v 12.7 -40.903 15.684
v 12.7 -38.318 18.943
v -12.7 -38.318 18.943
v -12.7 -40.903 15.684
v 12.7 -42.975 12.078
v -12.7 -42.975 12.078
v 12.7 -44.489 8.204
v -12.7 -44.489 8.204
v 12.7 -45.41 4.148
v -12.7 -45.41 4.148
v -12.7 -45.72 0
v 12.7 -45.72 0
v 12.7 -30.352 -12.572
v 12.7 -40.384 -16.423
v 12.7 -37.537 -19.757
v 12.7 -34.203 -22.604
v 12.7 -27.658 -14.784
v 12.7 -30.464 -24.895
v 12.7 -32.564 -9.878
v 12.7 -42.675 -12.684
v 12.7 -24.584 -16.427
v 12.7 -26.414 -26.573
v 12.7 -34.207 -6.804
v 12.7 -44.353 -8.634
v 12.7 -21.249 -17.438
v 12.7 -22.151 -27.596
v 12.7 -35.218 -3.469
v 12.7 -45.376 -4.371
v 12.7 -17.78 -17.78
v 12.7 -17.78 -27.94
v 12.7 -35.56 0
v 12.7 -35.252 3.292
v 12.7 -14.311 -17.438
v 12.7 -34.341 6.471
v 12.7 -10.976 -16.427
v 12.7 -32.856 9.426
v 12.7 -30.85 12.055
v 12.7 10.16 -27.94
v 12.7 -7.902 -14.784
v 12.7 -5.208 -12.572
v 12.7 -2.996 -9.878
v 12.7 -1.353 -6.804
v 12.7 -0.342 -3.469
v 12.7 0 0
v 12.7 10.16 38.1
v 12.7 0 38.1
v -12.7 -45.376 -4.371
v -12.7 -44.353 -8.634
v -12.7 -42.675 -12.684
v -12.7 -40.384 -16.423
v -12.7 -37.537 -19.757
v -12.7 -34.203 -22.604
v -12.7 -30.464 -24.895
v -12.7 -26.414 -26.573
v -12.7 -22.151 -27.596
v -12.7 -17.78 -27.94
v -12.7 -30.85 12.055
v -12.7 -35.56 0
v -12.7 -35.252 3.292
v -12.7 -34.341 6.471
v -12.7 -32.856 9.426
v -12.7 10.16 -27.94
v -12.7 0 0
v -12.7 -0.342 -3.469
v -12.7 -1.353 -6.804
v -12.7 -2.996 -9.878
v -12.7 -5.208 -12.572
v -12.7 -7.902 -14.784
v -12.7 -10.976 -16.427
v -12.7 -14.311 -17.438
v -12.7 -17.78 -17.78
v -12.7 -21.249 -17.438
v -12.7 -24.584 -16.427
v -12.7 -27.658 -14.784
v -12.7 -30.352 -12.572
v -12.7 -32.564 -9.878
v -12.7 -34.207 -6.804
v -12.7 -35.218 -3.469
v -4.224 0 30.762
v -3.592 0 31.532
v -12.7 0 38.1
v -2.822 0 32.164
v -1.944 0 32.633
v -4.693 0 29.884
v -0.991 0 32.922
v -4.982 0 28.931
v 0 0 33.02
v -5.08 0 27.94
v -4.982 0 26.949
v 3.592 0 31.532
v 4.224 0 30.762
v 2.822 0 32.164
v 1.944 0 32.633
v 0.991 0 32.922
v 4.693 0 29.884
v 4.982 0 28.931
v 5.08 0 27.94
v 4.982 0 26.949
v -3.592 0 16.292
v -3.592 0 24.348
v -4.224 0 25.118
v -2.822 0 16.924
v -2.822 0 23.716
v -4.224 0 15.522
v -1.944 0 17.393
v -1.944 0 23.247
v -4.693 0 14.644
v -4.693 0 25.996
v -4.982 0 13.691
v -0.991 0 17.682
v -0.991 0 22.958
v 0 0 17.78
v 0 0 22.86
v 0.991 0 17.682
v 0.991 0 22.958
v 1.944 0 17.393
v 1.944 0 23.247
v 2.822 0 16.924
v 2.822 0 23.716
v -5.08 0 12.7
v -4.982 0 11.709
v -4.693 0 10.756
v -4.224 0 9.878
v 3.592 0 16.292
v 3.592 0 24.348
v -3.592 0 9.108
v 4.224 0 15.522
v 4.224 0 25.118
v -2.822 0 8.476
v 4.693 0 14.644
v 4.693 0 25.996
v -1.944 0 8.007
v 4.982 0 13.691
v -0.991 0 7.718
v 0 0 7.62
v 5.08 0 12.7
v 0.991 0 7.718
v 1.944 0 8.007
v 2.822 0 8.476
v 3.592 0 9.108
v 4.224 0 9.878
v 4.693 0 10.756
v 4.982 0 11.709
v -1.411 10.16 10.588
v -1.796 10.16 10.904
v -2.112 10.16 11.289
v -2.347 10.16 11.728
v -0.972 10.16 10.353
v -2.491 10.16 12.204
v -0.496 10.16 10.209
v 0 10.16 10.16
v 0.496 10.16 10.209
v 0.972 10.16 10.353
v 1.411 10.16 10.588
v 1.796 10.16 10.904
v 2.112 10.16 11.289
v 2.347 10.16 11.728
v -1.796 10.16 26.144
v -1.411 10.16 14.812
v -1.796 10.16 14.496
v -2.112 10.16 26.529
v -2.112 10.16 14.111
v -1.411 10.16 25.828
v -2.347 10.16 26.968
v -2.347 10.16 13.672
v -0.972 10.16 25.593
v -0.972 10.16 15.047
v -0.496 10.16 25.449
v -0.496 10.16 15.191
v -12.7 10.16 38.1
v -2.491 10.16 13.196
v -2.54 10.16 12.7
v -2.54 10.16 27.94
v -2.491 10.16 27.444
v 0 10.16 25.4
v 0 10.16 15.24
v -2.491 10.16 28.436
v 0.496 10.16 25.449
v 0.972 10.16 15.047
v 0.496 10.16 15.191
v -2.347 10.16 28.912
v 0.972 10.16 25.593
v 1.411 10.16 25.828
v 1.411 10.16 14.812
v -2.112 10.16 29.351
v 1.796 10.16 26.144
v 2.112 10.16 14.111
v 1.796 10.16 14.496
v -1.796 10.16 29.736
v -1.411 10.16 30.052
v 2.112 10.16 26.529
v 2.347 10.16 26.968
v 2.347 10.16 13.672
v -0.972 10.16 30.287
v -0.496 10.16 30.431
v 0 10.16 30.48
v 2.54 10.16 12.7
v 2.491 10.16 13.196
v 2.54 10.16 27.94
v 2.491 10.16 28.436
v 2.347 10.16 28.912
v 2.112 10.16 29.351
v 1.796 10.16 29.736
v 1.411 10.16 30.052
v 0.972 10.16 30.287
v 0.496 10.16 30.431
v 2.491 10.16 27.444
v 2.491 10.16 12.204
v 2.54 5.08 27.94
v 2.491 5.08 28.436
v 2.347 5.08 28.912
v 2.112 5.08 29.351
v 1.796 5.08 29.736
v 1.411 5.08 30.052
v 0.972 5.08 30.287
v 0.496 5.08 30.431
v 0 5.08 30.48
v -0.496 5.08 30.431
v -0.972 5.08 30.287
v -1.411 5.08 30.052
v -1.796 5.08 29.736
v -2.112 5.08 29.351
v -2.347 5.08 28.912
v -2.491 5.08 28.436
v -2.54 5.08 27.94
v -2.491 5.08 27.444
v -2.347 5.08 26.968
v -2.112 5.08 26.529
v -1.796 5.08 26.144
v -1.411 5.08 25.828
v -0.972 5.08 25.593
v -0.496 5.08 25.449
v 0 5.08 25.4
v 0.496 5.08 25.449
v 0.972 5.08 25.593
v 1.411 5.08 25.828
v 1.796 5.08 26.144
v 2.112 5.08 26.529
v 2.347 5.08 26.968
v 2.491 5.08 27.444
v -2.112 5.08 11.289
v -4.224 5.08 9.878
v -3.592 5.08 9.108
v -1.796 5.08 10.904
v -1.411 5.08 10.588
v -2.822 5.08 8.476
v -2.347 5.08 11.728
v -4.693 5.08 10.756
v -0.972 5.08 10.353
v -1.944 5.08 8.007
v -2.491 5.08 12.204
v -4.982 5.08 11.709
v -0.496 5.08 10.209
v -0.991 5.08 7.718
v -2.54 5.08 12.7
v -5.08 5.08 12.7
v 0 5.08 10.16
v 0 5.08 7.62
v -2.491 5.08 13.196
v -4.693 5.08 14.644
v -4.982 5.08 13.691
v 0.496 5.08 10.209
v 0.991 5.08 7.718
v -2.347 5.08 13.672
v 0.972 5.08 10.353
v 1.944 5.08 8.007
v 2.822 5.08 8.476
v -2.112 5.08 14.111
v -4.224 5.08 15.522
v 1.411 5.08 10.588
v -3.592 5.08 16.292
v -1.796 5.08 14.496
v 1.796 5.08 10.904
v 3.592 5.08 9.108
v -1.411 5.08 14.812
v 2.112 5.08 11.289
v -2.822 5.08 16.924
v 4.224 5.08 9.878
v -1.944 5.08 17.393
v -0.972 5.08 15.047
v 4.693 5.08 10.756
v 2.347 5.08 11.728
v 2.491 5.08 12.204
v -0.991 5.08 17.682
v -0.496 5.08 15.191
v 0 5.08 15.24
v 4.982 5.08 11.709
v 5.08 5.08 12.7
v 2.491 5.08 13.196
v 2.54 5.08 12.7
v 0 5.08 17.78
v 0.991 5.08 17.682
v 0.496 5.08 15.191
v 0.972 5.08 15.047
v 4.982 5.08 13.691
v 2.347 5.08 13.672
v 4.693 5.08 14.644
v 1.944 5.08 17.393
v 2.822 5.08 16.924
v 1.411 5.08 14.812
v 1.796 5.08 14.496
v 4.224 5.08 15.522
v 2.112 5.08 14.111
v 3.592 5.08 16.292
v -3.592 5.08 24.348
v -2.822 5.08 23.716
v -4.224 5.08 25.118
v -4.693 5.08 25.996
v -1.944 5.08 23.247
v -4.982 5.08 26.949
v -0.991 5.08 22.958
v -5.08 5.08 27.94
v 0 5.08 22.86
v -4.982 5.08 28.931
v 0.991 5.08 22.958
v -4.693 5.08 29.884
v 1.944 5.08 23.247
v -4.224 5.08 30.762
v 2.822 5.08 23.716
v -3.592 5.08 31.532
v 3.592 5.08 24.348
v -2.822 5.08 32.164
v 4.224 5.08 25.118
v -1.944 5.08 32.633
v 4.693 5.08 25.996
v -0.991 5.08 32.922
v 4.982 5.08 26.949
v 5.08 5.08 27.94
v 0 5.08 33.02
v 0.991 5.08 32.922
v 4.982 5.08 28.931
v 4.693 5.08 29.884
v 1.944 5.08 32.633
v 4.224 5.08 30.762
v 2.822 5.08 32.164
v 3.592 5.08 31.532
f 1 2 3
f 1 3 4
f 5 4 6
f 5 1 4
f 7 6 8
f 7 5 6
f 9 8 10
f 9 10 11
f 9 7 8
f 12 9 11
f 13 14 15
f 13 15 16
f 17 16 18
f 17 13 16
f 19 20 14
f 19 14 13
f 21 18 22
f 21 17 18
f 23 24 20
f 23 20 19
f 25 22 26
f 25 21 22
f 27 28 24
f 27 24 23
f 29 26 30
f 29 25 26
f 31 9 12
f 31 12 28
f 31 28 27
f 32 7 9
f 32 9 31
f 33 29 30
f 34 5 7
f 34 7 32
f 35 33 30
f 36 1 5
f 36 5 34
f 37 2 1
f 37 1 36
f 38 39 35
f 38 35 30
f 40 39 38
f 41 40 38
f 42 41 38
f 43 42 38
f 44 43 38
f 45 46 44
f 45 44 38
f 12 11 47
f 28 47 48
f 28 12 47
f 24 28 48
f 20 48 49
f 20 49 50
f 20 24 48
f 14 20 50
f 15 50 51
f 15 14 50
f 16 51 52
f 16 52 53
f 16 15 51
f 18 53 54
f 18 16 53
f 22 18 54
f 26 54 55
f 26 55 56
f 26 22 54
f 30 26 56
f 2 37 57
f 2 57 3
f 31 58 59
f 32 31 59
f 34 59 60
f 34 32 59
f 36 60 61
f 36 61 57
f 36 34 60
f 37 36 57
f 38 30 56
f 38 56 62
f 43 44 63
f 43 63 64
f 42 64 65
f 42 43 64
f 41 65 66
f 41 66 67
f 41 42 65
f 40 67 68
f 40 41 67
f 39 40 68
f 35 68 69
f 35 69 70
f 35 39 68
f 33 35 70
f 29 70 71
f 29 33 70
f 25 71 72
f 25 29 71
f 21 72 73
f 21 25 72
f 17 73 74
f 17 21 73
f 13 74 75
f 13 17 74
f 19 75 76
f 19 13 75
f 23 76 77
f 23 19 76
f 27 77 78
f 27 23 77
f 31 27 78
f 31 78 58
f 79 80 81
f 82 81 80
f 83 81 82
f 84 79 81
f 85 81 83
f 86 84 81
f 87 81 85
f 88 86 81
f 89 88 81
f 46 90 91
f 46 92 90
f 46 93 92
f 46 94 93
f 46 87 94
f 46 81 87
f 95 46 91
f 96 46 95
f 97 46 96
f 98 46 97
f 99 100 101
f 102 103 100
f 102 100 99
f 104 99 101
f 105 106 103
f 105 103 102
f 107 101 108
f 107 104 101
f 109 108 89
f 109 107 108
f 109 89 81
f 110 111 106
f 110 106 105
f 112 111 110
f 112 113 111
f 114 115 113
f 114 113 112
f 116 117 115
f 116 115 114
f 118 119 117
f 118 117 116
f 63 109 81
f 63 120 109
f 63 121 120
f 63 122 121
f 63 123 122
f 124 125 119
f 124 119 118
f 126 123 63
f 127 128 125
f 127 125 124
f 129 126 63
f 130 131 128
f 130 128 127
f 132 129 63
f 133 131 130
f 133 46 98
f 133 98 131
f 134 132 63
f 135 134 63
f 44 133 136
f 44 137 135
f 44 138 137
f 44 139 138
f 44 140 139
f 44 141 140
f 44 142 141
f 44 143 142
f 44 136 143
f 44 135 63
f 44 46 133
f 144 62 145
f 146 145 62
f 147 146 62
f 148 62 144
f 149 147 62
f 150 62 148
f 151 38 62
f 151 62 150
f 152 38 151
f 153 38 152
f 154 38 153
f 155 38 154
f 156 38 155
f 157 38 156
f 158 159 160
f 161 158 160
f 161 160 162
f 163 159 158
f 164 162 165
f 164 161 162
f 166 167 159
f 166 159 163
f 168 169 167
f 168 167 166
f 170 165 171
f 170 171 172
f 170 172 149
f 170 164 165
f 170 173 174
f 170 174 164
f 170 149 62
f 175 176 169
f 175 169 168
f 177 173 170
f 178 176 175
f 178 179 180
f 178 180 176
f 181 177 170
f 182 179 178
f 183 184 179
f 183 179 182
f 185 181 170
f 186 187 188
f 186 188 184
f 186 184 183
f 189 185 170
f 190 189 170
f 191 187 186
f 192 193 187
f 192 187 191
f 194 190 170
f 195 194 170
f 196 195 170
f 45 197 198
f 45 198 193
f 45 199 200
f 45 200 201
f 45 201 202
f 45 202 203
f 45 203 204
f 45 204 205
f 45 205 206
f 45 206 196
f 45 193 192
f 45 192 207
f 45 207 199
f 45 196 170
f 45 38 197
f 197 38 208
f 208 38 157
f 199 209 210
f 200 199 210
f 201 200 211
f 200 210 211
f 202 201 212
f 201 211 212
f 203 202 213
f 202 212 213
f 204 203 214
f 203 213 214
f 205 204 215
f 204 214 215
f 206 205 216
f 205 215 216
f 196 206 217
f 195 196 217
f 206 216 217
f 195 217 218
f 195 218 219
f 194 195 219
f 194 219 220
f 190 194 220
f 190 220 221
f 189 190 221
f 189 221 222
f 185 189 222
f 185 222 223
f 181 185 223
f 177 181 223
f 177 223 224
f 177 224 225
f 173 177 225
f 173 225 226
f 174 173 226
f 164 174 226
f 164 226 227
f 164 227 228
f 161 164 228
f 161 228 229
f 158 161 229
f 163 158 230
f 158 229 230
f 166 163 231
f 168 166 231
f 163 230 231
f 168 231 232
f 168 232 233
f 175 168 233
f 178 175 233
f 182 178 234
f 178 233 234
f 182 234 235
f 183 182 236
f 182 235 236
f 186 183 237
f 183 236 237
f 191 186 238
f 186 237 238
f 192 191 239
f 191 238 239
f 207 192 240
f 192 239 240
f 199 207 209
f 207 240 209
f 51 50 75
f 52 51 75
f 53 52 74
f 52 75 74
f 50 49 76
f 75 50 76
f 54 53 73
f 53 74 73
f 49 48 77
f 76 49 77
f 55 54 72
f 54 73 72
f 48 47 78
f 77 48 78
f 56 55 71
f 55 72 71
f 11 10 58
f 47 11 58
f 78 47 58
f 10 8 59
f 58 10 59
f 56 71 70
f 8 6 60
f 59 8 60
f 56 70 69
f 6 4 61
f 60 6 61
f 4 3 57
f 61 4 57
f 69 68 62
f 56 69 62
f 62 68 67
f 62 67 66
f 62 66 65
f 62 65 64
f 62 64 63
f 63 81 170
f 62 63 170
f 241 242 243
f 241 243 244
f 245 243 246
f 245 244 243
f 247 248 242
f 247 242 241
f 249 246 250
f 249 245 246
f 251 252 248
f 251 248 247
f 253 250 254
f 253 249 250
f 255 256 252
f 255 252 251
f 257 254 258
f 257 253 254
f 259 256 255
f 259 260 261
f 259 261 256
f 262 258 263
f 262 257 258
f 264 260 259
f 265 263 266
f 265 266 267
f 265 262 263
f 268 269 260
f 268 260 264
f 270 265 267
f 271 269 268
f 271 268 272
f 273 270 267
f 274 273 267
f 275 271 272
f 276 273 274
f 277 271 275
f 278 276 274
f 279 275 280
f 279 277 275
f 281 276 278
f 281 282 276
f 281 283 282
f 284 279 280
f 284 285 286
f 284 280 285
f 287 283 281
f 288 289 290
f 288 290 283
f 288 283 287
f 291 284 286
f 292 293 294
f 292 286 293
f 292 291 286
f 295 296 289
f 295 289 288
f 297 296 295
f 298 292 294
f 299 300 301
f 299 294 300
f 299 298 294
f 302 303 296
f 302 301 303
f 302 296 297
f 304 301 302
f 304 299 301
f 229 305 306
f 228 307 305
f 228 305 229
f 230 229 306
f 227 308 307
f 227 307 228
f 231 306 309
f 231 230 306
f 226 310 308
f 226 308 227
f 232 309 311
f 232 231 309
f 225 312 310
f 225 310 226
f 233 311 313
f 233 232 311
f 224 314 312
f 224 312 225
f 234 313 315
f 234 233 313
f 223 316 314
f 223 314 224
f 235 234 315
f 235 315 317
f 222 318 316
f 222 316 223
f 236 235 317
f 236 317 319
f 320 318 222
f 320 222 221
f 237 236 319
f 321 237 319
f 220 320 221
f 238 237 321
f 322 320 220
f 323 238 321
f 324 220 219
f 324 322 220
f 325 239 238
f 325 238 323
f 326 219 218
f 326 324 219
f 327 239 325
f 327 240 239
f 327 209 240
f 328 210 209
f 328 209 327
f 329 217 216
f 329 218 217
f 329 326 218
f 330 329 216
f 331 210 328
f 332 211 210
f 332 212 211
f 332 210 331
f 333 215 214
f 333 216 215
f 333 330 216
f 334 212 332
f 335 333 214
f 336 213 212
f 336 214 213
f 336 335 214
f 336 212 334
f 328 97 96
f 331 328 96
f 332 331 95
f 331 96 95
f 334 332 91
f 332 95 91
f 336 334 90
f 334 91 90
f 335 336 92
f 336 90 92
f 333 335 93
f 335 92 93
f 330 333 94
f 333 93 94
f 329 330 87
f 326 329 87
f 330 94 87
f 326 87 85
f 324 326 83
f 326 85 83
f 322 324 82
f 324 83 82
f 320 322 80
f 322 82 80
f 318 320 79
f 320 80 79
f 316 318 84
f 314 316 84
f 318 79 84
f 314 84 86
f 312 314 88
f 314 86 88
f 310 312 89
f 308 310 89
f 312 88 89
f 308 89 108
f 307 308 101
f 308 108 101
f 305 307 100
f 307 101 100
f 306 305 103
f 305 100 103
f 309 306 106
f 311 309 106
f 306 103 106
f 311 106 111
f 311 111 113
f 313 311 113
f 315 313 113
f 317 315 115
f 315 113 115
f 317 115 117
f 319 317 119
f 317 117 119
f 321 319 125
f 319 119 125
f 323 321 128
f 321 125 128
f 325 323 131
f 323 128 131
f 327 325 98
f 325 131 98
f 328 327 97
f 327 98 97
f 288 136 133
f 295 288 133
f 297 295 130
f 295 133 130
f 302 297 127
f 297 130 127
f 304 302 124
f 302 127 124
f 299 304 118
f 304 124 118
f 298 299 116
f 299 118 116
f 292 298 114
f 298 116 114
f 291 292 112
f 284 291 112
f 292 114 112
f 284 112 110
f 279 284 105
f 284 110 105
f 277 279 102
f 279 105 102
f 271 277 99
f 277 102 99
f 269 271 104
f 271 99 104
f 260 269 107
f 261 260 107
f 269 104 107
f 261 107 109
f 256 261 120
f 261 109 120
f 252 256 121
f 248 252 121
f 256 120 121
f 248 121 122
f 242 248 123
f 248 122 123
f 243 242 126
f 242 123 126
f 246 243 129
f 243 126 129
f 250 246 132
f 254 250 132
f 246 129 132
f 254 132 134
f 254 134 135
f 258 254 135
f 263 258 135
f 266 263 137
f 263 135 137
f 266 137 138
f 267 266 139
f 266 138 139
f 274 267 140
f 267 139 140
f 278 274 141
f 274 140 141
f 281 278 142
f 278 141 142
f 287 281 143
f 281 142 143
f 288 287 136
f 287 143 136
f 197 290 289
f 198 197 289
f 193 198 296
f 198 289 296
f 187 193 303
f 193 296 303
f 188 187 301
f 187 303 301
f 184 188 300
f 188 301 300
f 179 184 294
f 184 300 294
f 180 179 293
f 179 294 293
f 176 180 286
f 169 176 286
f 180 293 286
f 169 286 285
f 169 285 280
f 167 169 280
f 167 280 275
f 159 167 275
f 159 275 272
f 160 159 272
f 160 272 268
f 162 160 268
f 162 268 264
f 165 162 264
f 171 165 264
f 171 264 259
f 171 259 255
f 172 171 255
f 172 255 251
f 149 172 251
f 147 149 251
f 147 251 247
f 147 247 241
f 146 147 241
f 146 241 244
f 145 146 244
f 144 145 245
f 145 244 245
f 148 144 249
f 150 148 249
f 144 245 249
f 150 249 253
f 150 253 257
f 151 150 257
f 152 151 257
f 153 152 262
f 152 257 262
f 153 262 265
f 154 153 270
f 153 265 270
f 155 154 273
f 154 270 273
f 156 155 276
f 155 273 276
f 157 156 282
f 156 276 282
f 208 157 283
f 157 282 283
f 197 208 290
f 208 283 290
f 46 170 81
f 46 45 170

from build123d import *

# Parameters (mm, degrees)
F1_DEPTH = 12.7
F2_R     = 2.54
F3_DEPTH = 10.161
F2_R_2   = 5.08
F4_DEPTH = 5.08


with BuildPart() as f1:
    # F0 (on Right) → F1 (new body, symmetric)
    with BuildSketch(Plane.YZ):
        with BuildLine():
            Line((0, 38.1), (0, 0))
            ThreePointArc((0, 0), (-17.78, -17.78), (-35.56, 0))
            ThreePointArc((-35.56, 0), (-34.340603, 6.471077), (-30.849669, 12.054549))
            Line((-30.849669, 12.054549), (-38.318051, 18.942863))
            ThreePointArc((-38.318051, 18.942863), (-43.803804, 10.168836), (-45.72, 0))
            ThreePointArc((-45.72, 0), (-37.536563, -19.756563), (-17.78, -27.94))
            ThreePointArc((-17.78, -27.94), (1.976563, -19.756563), (10.16, 0))
            Line((10.16, 0), (10.16, 38.1))
            Line((10.16, 38.1), (0, 38.1))
        make_face()
        with BuildLine():
            Line((10.16, -27.94), (10.16, 0))
            ThreePointArc((10.16, 0), (1.976563, -19.756563), (-17.78, -27.94))
            Line((-17.78, -27.94), (10.16, -27.94))
        make_face()
    extrude(amount=F1_DEPTH, both=True)

    # F2 (on face) → F3 (cut, through all)
    with BuildSketch(Plane.XZ):
        with Locations((0, 27.94)):
            Circle(F2_R)
        with Locations((0, 12.7)):
            Circle(F2_R)
    extrude(amount=-F3_DEPTH, mode=Mode.SUBTRACT)

    # F2 (on face) → F4 (cut)
    with BuildSketch(Plane.XZ):
        with Locations((0, 27.94)):
            Circle(F2_R_2)
        with Locations((0, 27.94)):
            Circle(F2_R, mode=Mode.SUBTRACT)
        with Locations((0, 12.7)):
            Circle(F2_R_2)
        with Locations((0, 12.7)):
            Circle(F2_R, mode=Mode.SUBTRACT)
    extrude(amount=-F4_DEPTH, mode=Mode.SUBTRACT)


solid = f1.part
